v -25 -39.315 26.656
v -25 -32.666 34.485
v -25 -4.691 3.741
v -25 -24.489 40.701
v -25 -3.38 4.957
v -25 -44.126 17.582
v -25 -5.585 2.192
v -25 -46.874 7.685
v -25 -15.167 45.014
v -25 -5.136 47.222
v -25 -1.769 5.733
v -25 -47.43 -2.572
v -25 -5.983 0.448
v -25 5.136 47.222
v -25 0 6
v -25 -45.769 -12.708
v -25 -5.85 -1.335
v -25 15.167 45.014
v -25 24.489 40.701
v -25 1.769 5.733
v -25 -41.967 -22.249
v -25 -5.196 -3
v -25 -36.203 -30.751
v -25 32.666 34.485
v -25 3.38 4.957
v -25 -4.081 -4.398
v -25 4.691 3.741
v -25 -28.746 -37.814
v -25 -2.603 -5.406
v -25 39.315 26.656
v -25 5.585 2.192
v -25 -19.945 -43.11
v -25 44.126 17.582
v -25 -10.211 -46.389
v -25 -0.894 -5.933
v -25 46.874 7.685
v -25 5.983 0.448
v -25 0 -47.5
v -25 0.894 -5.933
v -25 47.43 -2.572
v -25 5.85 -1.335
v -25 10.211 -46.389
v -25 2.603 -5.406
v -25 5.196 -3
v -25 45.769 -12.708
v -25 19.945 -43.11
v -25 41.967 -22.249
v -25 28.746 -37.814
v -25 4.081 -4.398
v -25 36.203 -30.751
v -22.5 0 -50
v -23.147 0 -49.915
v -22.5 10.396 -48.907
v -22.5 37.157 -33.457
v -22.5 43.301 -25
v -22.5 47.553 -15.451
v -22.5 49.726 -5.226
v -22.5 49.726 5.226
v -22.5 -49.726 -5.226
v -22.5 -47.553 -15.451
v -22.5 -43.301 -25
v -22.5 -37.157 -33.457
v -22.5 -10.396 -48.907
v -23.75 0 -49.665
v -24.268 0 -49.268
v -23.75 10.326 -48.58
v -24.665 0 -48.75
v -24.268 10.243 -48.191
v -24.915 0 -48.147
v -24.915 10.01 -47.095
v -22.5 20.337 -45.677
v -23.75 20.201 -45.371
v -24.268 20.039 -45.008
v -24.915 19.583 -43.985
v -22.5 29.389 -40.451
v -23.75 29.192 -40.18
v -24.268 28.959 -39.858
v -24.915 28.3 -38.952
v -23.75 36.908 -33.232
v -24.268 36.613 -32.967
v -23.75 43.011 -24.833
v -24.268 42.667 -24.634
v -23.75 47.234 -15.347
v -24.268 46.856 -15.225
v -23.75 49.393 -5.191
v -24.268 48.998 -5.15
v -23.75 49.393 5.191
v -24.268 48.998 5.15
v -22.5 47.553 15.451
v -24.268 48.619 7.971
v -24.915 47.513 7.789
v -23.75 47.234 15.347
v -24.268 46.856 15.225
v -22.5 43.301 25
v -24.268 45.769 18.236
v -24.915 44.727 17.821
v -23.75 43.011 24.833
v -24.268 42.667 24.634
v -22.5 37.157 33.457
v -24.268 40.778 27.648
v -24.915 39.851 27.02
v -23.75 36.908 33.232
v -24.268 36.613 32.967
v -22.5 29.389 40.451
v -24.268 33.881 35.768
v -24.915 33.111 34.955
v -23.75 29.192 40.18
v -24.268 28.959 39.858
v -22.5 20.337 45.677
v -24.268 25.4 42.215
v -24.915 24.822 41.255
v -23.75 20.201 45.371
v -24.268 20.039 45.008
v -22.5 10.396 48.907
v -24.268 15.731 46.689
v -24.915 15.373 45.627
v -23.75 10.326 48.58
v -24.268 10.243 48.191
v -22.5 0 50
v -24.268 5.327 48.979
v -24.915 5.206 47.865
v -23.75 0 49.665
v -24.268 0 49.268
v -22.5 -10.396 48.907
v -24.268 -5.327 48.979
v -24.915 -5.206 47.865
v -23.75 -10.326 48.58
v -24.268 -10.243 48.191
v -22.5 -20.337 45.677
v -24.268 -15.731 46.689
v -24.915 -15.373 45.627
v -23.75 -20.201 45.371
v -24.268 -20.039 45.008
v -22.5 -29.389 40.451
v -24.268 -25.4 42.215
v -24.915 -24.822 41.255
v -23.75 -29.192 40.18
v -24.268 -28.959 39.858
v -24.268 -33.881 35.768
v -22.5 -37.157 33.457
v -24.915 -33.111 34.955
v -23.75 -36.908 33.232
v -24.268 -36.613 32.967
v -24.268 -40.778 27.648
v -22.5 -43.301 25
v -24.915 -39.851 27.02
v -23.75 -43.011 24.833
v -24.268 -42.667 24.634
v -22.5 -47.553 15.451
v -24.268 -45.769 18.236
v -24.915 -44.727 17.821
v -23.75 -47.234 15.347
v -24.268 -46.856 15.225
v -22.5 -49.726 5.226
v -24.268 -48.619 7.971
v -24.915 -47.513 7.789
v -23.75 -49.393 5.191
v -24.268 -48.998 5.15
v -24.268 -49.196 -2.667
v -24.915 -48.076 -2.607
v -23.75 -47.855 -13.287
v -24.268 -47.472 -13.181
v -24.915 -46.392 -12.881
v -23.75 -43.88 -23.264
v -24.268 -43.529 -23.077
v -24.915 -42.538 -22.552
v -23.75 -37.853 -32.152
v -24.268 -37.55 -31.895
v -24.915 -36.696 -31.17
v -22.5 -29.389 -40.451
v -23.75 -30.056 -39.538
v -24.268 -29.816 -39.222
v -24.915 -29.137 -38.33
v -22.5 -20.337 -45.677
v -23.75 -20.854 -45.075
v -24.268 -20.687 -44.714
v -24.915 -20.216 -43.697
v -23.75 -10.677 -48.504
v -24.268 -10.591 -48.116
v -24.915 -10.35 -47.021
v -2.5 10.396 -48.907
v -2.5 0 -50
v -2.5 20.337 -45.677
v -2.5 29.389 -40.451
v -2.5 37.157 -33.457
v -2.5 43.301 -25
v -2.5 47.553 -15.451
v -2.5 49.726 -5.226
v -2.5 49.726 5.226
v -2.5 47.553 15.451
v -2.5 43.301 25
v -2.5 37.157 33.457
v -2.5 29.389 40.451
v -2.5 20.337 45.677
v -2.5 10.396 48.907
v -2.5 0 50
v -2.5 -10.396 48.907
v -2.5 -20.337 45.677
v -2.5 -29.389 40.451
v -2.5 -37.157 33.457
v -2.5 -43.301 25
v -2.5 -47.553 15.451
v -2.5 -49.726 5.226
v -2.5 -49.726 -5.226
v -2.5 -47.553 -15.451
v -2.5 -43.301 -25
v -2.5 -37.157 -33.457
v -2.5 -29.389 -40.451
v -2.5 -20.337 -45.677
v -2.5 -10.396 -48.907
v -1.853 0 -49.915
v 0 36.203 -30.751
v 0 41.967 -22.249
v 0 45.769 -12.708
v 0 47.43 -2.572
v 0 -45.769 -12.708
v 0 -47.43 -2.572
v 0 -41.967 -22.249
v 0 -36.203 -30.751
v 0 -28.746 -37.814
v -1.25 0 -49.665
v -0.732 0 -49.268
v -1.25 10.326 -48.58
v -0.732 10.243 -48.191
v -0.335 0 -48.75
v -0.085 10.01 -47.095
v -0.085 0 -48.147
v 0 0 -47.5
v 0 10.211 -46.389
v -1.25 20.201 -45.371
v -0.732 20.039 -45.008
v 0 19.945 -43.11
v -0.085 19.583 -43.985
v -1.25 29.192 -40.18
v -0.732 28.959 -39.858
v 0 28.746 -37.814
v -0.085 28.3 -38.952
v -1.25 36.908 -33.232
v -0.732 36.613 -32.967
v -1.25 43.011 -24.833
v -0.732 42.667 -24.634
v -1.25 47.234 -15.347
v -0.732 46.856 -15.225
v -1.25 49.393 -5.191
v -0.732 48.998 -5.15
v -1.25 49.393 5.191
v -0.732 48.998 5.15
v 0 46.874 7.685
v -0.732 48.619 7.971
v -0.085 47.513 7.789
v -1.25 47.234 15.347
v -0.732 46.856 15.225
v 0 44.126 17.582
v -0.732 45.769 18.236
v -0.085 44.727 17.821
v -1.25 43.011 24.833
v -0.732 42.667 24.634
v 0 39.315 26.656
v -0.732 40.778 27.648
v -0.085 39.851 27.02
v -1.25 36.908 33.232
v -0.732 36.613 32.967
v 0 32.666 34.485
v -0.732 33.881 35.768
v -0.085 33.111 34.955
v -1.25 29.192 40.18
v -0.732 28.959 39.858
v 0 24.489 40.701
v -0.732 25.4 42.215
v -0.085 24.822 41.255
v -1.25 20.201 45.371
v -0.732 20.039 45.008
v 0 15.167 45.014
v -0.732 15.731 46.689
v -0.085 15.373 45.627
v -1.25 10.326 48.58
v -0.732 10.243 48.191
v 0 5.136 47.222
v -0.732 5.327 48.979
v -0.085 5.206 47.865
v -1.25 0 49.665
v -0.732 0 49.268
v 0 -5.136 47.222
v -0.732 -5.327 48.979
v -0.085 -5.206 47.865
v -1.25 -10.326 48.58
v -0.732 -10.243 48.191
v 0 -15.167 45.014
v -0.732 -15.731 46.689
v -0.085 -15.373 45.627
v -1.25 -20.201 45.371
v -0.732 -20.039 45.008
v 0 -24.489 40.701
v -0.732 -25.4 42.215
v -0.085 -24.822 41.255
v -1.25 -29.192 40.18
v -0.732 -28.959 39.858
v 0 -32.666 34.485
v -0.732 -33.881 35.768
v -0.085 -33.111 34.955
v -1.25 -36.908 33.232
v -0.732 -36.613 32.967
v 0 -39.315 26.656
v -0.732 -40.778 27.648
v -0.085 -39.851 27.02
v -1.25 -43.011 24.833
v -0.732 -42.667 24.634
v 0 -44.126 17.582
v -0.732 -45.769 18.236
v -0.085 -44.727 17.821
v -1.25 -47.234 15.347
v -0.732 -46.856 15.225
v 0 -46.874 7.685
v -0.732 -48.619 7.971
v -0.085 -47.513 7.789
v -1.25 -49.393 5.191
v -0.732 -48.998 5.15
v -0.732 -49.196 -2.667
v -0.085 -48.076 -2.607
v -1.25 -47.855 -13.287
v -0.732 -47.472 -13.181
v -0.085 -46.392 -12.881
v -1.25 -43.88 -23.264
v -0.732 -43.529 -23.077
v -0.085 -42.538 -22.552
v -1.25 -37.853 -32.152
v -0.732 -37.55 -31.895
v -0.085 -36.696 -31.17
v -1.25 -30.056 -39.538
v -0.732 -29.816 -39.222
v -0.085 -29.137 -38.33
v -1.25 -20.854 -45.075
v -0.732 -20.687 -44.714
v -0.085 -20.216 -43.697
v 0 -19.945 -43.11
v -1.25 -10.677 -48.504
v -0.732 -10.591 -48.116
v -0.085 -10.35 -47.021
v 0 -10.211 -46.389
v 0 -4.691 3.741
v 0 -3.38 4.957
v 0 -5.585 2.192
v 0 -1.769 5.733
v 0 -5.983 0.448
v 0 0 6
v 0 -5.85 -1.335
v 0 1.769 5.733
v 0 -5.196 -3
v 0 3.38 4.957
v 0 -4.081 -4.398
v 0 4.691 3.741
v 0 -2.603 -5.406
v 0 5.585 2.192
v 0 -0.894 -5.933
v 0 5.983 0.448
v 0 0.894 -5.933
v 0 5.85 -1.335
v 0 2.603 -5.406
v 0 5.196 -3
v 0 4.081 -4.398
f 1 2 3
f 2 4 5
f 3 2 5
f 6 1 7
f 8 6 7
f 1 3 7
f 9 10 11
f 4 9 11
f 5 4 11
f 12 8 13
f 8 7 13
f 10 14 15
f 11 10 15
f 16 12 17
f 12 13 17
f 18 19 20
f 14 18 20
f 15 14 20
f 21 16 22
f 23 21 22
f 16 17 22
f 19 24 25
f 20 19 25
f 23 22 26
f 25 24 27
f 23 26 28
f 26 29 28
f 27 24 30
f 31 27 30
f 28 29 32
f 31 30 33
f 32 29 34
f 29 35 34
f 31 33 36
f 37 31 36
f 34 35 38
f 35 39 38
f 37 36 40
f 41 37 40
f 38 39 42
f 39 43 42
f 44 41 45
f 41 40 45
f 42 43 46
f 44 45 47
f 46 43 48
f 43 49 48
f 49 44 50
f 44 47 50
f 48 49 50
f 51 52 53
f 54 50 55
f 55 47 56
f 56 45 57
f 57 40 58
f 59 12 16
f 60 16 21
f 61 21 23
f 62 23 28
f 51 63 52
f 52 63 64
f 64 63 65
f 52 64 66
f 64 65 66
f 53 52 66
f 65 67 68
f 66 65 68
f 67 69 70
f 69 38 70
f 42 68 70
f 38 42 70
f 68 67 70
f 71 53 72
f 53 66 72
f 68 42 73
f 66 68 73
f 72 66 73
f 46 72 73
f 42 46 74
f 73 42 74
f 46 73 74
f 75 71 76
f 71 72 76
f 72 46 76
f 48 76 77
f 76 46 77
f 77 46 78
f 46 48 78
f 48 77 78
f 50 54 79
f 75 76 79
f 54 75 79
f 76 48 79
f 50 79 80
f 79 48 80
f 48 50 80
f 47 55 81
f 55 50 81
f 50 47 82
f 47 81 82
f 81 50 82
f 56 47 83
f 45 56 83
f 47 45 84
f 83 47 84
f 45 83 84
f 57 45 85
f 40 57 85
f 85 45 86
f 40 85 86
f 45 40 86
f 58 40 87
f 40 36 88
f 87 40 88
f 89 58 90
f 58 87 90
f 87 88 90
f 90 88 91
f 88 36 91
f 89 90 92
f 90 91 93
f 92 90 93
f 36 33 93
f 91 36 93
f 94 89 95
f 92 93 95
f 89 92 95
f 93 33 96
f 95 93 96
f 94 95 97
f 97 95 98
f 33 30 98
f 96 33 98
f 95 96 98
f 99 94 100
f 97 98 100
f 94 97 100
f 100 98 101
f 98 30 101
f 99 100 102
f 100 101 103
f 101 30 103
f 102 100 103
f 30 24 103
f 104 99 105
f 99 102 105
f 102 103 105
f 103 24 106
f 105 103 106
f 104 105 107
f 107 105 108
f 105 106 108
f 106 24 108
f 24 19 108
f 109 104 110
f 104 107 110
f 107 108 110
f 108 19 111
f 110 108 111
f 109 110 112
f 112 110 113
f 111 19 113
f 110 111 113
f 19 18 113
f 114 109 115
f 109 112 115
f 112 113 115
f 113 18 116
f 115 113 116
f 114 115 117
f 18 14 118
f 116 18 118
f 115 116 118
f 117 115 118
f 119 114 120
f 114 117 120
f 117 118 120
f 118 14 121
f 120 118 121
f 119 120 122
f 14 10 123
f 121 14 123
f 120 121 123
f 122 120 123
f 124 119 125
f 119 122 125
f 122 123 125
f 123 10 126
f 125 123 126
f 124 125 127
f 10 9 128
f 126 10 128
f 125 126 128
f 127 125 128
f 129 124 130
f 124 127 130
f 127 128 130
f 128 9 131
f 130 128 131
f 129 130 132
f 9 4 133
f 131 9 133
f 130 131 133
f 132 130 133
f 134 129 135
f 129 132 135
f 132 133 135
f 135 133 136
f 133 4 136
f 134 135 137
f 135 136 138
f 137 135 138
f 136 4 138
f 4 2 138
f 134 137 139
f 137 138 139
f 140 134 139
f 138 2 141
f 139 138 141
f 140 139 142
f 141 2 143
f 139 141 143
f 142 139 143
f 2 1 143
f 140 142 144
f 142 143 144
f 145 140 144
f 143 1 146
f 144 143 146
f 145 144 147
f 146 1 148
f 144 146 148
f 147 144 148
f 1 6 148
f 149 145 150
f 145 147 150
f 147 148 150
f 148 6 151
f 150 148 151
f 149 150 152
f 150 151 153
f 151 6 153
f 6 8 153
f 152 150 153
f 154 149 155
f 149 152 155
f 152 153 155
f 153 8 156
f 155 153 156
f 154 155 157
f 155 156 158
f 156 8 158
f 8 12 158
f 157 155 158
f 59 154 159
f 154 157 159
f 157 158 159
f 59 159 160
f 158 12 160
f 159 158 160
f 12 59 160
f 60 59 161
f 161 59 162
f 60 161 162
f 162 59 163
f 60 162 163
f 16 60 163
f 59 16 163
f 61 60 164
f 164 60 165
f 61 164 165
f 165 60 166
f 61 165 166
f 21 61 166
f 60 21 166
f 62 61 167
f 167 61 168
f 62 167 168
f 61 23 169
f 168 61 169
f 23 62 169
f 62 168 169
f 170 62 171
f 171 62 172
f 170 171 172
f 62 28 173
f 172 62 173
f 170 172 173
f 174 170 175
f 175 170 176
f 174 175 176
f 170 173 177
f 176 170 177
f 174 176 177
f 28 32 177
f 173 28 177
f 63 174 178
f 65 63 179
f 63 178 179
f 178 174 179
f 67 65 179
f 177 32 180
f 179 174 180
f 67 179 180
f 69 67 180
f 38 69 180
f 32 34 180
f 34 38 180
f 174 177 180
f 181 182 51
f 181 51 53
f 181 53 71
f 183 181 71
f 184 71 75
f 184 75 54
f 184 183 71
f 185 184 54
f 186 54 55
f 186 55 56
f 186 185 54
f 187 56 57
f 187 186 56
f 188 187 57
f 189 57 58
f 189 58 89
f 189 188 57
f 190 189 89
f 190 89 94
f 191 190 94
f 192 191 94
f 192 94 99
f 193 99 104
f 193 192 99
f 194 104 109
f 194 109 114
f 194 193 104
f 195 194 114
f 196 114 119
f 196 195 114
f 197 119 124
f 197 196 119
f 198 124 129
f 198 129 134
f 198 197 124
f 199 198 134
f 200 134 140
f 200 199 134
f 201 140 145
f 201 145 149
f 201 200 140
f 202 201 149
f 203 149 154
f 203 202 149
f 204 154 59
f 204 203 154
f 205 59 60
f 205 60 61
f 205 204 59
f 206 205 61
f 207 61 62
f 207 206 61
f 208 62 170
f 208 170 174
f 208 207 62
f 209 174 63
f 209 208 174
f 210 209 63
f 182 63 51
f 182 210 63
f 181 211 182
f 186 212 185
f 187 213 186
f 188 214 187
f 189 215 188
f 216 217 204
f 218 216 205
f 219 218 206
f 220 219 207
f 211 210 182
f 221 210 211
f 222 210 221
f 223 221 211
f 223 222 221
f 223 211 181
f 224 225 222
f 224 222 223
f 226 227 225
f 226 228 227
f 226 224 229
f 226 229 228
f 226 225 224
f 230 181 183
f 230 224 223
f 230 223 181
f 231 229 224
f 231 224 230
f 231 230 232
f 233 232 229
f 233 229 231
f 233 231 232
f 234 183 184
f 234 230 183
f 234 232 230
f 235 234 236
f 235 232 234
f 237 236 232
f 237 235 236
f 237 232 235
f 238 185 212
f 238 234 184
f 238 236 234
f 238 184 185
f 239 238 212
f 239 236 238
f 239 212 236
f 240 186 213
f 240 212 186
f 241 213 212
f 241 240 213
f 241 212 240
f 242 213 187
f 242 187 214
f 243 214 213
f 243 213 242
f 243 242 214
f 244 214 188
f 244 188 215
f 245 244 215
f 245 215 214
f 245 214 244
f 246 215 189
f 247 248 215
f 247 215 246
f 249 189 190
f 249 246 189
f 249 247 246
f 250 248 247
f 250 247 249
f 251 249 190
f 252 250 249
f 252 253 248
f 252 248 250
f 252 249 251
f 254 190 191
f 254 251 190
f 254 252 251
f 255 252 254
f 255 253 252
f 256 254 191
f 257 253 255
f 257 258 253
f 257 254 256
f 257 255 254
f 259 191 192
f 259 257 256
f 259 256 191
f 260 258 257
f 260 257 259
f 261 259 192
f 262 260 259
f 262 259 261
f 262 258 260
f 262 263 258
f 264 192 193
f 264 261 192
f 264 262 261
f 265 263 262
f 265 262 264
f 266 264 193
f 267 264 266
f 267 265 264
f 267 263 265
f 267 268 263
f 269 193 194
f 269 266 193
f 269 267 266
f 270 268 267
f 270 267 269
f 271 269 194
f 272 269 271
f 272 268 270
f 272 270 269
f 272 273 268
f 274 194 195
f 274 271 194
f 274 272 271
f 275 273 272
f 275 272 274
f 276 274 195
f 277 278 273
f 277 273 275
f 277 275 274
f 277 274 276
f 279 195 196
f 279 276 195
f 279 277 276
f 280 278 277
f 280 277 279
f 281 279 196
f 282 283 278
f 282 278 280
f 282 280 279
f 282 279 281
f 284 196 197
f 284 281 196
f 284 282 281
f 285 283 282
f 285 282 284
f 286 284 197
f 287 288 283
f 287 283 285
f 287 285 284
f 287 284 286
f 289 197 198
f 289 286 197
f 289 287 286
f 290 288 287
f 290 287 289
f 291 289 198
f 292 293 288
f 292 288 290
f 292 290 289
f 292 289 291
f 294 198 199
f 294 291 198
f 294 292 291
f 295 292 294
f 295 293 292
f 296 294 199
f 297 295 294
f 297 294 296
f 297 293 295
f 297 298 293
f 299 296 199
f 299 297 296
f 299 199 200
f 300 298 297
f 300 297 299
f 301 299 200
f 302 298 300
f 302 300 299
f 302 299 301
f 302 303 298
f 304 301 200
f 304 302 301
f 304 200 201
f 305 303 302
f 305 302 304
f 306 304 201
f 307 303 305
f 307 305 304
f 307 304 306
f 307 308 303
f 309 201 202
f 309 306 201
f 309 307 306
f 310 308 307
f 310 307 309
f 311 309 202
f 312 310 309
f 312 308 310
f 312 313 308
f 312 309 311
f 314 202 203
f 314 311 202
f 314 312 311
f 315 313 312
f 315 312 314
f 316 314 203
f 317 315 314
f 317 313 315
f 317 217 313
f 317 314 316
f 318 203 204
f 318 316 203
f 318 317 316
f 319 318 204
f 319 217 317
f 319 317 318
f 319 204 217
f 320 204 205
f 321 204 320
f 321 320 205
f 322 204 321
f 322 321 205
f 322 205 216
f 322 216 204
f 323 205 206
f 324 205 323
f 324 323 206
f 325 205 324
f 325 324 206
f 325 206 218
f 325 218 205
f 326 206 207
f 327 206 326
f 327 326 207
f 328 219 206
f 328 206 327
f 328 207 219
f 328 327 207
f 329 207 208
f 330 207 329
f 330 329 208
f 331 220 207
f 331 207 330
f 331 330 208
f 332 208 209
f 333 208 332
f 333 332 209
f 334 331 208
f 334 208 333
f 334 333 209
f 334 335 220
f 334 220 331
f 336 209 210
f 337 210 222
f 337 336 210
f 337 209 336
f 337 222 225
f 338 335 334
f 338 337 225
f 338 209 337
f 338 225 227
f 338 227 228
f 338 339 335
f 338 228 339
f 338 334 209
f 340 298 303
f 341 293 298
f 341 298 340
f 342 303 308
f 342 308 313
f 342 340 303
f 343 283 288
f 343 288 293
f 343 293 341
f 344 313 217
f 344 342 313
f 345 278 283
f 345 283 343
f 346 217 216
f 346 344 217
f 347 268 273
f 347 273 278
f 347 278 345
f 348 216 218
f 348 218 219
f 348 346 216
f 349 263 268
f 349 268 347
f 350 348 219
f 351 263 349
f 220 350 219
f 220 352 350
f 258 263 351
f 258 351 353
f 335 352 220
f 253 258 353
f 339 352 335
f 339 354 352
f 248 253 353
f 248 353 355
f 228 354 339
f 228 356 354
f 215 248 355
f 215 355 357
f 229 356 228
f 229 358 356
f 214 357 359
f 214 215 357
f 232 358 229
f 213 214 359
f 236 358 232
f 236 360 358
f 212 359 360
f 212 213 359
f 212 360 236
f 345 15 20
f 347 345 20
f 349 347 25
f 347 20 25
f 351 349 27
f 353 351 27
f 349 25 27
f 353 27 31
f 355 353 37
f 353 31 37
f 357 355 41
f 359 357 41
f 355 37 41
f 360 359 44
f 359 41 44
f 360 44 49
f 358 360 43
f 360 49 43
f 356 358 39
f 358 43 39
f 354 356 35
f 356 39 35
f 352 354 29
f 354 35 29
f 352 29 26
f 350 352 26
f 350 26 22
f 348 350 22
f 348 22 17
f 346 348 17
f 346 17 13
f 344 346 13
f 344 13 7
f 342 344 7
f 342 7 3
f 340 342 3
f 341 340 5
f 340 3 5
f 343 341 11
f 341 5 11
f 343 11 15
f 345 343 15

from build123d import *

# Parameters (mm, degrees)
SKETCH2_R           = 50
BOSS_EXTRUDE1_DEPTH = 25
FILLET1_R           = 2.5
SKETCH3_R           = 6
CUT_EXTRUDE1_DEPTH  = 25


with BuildPart() as part:
    # Sketch2 → Boss-Extrude1 (new body)
    with BuildSketch(Plane(origin=(0, 0, 0), x_dir=(0, 0, -1), z_dir=(1, 0, 0))):
        Circle(SKETCH2_R)
    extrude(amount=-BOSS_EXTRUDE1_DEPTH)

    # Fillet1
    fillet1_edges = [part.edges().sort_by_distance(p)[0] for p in [
        (0, 0, 50),
        (-25, 0, 50),
    ]]
    fillet(fillet1_edges, radius=FILLET1_R)

    # Sketch3 → Cut-Extrude1 (cut)
    with BuildSketch(Plane.ZY.offset(25)):
        Circle(SKETCH3_R)
    extrude(amount=-CUT_EXTRUDE1_DEPTH, mode=Mode.SUBTRACT)


solid = part.part
